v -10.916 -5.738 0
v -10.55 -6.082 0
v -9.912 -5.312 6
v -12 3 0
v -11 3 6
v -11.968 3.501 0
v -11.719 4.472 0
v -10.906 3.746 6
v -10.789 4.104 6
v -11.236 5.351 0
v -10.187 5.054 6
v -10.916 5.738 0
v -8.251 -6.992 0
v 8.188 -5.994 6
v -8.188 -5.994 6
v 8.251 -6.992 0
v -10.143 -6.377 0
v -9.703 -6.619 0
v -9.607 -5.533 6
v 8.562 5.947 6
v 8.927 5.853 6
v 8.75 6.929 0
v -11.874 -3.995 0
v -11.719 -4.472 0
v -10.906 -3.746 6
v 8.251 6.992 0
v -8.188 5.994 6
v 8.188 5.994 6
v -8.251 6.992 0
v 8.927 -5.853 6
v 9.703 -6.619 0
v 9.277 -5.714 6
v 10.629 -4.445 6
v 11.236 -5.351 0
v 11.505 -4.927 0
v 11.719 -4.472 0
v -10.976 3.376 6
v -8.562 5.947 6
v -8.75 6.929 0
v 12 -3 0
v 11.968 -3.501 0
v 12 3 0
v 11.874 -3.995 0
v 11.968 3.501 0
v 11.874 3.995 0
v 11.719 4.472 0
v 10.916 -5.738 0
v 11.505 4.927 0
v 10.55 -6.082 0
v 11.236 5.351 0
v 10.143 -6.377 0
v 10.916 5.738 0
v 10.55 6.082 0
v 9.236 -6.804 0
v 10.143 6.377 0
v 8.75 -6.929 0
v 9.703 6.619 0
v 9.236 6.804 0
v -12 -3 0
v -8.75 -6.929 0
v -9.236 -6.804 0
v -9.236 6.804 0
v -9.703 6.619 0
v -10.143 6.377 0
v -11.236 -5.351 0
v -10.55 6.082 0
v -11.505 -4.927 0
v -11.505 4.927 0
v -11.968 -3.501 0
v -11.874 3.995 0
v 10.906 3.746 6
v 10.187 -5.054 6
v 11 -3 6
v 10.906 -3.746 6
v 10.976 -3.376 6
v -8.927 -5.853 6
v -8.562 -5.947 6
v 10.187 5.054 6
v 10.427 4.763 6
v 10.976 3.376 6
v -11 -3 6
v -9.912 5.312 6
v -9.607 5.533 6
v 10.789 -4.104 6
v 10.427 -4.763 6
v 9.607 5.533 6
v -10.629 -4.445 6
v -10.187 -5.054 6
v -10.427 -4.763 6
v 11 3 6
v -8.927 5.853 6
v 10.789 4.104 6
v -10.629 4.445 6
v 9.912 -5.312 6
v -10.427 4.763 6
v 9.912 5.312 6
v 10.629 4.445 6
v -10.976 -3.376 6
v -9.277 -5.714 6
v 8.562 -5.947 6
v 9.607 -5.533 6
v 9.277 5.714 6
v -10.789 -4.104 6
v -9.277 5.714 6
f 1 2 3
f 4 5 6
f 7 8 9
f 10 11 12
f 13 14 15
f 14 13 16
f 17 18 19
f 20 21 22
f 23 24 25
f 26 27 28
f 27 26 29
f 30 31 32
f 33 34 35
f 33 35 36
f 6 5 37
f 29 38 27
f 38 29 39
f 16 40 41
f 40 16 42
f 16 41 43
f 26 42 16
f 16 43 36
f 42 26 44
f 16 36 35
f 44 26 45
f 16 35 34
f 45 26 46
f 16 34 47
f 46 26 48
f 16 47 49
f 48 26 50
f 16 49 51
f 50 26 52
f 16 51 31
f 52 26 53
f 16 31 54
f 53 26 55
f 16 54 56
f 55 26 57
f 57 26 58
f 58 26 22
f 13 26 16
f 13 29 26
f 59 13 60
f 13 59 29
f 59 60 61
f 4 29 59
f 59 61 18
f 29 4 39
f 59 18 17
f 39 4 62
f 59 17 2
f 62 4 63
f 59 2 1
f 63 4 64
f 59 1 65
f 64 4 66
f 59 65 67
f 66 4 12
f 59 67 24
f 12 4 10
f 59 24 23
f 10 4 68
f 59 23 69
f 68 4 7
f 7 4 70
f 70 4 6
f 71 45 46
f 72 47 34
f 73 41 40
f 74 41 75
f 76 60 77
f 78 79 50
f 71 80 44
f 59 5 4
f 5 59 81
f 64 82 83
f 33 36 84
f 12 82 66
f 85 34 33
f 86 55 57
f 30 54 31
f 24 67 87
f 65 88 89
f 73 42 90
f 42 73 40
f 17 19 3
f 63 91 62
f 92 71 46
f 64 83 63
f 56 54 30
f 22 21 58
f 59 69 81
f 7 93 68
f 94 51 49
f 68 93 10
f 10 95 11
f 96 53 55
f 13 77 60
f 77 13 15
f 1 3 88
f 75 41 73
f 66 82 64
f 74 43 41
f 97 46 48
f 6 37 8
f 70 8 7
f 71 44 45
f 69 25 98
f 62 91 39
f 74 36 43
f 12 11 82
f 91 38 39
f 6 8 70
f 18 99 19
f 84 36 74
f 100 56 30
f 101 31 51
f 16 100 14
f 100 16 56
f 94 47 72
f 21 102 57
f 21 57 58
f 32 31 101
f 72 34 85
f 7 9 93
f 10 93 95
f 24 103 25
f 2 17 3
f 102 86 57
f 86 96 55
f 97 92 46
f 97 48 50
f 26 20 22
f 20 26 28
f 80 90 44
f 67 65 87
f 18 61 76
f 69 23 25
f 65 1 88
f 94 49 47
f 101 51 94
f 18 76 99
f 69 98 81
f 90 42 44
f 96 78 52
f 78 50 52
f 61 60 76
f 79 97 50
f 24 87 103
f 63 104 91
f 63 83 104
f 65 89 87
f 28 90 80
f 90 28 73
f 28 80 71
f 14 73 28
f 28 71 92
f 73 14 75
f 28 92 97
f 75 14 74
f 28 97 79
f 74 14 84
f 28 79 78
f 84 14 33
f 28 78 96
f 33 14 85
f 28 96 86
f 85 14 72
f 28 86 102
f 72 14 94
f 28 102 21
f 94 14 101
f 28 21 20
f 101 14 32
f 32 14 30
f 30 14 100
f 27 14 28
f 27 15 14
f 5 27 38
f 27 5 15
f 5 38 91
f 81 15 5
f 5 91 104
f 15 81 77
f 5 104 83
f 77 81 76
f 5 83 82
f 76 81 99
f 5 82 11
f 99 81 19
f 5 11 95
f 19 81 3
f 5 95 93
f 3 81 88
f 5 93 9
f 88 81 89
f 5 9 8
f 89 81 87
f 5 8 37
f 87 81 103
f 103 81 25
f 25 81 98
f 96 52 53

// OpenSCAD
$fn = 50;

difference() {
	union() {
		hull() {
			translate(v = [-8.0, 3.0, 0]) {
				cylinder(h = 6, r1 = 4, r2 = 3.0);
			}
			translate(v = [8.0, 3.0, 0]) {
				cylinder(h = 6, r1 = 4, r2 = 3.0);
			}
			translate(v = [-8.0, -3.0, 0]) {
				cylinder(h = 6, r1 = 4, r2 = 3.0);
			}
			translate(v = [8.0, -3.0, 0]) {
				cylinder(h = 6, r1 = 4, r2 = 3.0);
			}
		}
	}
	union();
}
